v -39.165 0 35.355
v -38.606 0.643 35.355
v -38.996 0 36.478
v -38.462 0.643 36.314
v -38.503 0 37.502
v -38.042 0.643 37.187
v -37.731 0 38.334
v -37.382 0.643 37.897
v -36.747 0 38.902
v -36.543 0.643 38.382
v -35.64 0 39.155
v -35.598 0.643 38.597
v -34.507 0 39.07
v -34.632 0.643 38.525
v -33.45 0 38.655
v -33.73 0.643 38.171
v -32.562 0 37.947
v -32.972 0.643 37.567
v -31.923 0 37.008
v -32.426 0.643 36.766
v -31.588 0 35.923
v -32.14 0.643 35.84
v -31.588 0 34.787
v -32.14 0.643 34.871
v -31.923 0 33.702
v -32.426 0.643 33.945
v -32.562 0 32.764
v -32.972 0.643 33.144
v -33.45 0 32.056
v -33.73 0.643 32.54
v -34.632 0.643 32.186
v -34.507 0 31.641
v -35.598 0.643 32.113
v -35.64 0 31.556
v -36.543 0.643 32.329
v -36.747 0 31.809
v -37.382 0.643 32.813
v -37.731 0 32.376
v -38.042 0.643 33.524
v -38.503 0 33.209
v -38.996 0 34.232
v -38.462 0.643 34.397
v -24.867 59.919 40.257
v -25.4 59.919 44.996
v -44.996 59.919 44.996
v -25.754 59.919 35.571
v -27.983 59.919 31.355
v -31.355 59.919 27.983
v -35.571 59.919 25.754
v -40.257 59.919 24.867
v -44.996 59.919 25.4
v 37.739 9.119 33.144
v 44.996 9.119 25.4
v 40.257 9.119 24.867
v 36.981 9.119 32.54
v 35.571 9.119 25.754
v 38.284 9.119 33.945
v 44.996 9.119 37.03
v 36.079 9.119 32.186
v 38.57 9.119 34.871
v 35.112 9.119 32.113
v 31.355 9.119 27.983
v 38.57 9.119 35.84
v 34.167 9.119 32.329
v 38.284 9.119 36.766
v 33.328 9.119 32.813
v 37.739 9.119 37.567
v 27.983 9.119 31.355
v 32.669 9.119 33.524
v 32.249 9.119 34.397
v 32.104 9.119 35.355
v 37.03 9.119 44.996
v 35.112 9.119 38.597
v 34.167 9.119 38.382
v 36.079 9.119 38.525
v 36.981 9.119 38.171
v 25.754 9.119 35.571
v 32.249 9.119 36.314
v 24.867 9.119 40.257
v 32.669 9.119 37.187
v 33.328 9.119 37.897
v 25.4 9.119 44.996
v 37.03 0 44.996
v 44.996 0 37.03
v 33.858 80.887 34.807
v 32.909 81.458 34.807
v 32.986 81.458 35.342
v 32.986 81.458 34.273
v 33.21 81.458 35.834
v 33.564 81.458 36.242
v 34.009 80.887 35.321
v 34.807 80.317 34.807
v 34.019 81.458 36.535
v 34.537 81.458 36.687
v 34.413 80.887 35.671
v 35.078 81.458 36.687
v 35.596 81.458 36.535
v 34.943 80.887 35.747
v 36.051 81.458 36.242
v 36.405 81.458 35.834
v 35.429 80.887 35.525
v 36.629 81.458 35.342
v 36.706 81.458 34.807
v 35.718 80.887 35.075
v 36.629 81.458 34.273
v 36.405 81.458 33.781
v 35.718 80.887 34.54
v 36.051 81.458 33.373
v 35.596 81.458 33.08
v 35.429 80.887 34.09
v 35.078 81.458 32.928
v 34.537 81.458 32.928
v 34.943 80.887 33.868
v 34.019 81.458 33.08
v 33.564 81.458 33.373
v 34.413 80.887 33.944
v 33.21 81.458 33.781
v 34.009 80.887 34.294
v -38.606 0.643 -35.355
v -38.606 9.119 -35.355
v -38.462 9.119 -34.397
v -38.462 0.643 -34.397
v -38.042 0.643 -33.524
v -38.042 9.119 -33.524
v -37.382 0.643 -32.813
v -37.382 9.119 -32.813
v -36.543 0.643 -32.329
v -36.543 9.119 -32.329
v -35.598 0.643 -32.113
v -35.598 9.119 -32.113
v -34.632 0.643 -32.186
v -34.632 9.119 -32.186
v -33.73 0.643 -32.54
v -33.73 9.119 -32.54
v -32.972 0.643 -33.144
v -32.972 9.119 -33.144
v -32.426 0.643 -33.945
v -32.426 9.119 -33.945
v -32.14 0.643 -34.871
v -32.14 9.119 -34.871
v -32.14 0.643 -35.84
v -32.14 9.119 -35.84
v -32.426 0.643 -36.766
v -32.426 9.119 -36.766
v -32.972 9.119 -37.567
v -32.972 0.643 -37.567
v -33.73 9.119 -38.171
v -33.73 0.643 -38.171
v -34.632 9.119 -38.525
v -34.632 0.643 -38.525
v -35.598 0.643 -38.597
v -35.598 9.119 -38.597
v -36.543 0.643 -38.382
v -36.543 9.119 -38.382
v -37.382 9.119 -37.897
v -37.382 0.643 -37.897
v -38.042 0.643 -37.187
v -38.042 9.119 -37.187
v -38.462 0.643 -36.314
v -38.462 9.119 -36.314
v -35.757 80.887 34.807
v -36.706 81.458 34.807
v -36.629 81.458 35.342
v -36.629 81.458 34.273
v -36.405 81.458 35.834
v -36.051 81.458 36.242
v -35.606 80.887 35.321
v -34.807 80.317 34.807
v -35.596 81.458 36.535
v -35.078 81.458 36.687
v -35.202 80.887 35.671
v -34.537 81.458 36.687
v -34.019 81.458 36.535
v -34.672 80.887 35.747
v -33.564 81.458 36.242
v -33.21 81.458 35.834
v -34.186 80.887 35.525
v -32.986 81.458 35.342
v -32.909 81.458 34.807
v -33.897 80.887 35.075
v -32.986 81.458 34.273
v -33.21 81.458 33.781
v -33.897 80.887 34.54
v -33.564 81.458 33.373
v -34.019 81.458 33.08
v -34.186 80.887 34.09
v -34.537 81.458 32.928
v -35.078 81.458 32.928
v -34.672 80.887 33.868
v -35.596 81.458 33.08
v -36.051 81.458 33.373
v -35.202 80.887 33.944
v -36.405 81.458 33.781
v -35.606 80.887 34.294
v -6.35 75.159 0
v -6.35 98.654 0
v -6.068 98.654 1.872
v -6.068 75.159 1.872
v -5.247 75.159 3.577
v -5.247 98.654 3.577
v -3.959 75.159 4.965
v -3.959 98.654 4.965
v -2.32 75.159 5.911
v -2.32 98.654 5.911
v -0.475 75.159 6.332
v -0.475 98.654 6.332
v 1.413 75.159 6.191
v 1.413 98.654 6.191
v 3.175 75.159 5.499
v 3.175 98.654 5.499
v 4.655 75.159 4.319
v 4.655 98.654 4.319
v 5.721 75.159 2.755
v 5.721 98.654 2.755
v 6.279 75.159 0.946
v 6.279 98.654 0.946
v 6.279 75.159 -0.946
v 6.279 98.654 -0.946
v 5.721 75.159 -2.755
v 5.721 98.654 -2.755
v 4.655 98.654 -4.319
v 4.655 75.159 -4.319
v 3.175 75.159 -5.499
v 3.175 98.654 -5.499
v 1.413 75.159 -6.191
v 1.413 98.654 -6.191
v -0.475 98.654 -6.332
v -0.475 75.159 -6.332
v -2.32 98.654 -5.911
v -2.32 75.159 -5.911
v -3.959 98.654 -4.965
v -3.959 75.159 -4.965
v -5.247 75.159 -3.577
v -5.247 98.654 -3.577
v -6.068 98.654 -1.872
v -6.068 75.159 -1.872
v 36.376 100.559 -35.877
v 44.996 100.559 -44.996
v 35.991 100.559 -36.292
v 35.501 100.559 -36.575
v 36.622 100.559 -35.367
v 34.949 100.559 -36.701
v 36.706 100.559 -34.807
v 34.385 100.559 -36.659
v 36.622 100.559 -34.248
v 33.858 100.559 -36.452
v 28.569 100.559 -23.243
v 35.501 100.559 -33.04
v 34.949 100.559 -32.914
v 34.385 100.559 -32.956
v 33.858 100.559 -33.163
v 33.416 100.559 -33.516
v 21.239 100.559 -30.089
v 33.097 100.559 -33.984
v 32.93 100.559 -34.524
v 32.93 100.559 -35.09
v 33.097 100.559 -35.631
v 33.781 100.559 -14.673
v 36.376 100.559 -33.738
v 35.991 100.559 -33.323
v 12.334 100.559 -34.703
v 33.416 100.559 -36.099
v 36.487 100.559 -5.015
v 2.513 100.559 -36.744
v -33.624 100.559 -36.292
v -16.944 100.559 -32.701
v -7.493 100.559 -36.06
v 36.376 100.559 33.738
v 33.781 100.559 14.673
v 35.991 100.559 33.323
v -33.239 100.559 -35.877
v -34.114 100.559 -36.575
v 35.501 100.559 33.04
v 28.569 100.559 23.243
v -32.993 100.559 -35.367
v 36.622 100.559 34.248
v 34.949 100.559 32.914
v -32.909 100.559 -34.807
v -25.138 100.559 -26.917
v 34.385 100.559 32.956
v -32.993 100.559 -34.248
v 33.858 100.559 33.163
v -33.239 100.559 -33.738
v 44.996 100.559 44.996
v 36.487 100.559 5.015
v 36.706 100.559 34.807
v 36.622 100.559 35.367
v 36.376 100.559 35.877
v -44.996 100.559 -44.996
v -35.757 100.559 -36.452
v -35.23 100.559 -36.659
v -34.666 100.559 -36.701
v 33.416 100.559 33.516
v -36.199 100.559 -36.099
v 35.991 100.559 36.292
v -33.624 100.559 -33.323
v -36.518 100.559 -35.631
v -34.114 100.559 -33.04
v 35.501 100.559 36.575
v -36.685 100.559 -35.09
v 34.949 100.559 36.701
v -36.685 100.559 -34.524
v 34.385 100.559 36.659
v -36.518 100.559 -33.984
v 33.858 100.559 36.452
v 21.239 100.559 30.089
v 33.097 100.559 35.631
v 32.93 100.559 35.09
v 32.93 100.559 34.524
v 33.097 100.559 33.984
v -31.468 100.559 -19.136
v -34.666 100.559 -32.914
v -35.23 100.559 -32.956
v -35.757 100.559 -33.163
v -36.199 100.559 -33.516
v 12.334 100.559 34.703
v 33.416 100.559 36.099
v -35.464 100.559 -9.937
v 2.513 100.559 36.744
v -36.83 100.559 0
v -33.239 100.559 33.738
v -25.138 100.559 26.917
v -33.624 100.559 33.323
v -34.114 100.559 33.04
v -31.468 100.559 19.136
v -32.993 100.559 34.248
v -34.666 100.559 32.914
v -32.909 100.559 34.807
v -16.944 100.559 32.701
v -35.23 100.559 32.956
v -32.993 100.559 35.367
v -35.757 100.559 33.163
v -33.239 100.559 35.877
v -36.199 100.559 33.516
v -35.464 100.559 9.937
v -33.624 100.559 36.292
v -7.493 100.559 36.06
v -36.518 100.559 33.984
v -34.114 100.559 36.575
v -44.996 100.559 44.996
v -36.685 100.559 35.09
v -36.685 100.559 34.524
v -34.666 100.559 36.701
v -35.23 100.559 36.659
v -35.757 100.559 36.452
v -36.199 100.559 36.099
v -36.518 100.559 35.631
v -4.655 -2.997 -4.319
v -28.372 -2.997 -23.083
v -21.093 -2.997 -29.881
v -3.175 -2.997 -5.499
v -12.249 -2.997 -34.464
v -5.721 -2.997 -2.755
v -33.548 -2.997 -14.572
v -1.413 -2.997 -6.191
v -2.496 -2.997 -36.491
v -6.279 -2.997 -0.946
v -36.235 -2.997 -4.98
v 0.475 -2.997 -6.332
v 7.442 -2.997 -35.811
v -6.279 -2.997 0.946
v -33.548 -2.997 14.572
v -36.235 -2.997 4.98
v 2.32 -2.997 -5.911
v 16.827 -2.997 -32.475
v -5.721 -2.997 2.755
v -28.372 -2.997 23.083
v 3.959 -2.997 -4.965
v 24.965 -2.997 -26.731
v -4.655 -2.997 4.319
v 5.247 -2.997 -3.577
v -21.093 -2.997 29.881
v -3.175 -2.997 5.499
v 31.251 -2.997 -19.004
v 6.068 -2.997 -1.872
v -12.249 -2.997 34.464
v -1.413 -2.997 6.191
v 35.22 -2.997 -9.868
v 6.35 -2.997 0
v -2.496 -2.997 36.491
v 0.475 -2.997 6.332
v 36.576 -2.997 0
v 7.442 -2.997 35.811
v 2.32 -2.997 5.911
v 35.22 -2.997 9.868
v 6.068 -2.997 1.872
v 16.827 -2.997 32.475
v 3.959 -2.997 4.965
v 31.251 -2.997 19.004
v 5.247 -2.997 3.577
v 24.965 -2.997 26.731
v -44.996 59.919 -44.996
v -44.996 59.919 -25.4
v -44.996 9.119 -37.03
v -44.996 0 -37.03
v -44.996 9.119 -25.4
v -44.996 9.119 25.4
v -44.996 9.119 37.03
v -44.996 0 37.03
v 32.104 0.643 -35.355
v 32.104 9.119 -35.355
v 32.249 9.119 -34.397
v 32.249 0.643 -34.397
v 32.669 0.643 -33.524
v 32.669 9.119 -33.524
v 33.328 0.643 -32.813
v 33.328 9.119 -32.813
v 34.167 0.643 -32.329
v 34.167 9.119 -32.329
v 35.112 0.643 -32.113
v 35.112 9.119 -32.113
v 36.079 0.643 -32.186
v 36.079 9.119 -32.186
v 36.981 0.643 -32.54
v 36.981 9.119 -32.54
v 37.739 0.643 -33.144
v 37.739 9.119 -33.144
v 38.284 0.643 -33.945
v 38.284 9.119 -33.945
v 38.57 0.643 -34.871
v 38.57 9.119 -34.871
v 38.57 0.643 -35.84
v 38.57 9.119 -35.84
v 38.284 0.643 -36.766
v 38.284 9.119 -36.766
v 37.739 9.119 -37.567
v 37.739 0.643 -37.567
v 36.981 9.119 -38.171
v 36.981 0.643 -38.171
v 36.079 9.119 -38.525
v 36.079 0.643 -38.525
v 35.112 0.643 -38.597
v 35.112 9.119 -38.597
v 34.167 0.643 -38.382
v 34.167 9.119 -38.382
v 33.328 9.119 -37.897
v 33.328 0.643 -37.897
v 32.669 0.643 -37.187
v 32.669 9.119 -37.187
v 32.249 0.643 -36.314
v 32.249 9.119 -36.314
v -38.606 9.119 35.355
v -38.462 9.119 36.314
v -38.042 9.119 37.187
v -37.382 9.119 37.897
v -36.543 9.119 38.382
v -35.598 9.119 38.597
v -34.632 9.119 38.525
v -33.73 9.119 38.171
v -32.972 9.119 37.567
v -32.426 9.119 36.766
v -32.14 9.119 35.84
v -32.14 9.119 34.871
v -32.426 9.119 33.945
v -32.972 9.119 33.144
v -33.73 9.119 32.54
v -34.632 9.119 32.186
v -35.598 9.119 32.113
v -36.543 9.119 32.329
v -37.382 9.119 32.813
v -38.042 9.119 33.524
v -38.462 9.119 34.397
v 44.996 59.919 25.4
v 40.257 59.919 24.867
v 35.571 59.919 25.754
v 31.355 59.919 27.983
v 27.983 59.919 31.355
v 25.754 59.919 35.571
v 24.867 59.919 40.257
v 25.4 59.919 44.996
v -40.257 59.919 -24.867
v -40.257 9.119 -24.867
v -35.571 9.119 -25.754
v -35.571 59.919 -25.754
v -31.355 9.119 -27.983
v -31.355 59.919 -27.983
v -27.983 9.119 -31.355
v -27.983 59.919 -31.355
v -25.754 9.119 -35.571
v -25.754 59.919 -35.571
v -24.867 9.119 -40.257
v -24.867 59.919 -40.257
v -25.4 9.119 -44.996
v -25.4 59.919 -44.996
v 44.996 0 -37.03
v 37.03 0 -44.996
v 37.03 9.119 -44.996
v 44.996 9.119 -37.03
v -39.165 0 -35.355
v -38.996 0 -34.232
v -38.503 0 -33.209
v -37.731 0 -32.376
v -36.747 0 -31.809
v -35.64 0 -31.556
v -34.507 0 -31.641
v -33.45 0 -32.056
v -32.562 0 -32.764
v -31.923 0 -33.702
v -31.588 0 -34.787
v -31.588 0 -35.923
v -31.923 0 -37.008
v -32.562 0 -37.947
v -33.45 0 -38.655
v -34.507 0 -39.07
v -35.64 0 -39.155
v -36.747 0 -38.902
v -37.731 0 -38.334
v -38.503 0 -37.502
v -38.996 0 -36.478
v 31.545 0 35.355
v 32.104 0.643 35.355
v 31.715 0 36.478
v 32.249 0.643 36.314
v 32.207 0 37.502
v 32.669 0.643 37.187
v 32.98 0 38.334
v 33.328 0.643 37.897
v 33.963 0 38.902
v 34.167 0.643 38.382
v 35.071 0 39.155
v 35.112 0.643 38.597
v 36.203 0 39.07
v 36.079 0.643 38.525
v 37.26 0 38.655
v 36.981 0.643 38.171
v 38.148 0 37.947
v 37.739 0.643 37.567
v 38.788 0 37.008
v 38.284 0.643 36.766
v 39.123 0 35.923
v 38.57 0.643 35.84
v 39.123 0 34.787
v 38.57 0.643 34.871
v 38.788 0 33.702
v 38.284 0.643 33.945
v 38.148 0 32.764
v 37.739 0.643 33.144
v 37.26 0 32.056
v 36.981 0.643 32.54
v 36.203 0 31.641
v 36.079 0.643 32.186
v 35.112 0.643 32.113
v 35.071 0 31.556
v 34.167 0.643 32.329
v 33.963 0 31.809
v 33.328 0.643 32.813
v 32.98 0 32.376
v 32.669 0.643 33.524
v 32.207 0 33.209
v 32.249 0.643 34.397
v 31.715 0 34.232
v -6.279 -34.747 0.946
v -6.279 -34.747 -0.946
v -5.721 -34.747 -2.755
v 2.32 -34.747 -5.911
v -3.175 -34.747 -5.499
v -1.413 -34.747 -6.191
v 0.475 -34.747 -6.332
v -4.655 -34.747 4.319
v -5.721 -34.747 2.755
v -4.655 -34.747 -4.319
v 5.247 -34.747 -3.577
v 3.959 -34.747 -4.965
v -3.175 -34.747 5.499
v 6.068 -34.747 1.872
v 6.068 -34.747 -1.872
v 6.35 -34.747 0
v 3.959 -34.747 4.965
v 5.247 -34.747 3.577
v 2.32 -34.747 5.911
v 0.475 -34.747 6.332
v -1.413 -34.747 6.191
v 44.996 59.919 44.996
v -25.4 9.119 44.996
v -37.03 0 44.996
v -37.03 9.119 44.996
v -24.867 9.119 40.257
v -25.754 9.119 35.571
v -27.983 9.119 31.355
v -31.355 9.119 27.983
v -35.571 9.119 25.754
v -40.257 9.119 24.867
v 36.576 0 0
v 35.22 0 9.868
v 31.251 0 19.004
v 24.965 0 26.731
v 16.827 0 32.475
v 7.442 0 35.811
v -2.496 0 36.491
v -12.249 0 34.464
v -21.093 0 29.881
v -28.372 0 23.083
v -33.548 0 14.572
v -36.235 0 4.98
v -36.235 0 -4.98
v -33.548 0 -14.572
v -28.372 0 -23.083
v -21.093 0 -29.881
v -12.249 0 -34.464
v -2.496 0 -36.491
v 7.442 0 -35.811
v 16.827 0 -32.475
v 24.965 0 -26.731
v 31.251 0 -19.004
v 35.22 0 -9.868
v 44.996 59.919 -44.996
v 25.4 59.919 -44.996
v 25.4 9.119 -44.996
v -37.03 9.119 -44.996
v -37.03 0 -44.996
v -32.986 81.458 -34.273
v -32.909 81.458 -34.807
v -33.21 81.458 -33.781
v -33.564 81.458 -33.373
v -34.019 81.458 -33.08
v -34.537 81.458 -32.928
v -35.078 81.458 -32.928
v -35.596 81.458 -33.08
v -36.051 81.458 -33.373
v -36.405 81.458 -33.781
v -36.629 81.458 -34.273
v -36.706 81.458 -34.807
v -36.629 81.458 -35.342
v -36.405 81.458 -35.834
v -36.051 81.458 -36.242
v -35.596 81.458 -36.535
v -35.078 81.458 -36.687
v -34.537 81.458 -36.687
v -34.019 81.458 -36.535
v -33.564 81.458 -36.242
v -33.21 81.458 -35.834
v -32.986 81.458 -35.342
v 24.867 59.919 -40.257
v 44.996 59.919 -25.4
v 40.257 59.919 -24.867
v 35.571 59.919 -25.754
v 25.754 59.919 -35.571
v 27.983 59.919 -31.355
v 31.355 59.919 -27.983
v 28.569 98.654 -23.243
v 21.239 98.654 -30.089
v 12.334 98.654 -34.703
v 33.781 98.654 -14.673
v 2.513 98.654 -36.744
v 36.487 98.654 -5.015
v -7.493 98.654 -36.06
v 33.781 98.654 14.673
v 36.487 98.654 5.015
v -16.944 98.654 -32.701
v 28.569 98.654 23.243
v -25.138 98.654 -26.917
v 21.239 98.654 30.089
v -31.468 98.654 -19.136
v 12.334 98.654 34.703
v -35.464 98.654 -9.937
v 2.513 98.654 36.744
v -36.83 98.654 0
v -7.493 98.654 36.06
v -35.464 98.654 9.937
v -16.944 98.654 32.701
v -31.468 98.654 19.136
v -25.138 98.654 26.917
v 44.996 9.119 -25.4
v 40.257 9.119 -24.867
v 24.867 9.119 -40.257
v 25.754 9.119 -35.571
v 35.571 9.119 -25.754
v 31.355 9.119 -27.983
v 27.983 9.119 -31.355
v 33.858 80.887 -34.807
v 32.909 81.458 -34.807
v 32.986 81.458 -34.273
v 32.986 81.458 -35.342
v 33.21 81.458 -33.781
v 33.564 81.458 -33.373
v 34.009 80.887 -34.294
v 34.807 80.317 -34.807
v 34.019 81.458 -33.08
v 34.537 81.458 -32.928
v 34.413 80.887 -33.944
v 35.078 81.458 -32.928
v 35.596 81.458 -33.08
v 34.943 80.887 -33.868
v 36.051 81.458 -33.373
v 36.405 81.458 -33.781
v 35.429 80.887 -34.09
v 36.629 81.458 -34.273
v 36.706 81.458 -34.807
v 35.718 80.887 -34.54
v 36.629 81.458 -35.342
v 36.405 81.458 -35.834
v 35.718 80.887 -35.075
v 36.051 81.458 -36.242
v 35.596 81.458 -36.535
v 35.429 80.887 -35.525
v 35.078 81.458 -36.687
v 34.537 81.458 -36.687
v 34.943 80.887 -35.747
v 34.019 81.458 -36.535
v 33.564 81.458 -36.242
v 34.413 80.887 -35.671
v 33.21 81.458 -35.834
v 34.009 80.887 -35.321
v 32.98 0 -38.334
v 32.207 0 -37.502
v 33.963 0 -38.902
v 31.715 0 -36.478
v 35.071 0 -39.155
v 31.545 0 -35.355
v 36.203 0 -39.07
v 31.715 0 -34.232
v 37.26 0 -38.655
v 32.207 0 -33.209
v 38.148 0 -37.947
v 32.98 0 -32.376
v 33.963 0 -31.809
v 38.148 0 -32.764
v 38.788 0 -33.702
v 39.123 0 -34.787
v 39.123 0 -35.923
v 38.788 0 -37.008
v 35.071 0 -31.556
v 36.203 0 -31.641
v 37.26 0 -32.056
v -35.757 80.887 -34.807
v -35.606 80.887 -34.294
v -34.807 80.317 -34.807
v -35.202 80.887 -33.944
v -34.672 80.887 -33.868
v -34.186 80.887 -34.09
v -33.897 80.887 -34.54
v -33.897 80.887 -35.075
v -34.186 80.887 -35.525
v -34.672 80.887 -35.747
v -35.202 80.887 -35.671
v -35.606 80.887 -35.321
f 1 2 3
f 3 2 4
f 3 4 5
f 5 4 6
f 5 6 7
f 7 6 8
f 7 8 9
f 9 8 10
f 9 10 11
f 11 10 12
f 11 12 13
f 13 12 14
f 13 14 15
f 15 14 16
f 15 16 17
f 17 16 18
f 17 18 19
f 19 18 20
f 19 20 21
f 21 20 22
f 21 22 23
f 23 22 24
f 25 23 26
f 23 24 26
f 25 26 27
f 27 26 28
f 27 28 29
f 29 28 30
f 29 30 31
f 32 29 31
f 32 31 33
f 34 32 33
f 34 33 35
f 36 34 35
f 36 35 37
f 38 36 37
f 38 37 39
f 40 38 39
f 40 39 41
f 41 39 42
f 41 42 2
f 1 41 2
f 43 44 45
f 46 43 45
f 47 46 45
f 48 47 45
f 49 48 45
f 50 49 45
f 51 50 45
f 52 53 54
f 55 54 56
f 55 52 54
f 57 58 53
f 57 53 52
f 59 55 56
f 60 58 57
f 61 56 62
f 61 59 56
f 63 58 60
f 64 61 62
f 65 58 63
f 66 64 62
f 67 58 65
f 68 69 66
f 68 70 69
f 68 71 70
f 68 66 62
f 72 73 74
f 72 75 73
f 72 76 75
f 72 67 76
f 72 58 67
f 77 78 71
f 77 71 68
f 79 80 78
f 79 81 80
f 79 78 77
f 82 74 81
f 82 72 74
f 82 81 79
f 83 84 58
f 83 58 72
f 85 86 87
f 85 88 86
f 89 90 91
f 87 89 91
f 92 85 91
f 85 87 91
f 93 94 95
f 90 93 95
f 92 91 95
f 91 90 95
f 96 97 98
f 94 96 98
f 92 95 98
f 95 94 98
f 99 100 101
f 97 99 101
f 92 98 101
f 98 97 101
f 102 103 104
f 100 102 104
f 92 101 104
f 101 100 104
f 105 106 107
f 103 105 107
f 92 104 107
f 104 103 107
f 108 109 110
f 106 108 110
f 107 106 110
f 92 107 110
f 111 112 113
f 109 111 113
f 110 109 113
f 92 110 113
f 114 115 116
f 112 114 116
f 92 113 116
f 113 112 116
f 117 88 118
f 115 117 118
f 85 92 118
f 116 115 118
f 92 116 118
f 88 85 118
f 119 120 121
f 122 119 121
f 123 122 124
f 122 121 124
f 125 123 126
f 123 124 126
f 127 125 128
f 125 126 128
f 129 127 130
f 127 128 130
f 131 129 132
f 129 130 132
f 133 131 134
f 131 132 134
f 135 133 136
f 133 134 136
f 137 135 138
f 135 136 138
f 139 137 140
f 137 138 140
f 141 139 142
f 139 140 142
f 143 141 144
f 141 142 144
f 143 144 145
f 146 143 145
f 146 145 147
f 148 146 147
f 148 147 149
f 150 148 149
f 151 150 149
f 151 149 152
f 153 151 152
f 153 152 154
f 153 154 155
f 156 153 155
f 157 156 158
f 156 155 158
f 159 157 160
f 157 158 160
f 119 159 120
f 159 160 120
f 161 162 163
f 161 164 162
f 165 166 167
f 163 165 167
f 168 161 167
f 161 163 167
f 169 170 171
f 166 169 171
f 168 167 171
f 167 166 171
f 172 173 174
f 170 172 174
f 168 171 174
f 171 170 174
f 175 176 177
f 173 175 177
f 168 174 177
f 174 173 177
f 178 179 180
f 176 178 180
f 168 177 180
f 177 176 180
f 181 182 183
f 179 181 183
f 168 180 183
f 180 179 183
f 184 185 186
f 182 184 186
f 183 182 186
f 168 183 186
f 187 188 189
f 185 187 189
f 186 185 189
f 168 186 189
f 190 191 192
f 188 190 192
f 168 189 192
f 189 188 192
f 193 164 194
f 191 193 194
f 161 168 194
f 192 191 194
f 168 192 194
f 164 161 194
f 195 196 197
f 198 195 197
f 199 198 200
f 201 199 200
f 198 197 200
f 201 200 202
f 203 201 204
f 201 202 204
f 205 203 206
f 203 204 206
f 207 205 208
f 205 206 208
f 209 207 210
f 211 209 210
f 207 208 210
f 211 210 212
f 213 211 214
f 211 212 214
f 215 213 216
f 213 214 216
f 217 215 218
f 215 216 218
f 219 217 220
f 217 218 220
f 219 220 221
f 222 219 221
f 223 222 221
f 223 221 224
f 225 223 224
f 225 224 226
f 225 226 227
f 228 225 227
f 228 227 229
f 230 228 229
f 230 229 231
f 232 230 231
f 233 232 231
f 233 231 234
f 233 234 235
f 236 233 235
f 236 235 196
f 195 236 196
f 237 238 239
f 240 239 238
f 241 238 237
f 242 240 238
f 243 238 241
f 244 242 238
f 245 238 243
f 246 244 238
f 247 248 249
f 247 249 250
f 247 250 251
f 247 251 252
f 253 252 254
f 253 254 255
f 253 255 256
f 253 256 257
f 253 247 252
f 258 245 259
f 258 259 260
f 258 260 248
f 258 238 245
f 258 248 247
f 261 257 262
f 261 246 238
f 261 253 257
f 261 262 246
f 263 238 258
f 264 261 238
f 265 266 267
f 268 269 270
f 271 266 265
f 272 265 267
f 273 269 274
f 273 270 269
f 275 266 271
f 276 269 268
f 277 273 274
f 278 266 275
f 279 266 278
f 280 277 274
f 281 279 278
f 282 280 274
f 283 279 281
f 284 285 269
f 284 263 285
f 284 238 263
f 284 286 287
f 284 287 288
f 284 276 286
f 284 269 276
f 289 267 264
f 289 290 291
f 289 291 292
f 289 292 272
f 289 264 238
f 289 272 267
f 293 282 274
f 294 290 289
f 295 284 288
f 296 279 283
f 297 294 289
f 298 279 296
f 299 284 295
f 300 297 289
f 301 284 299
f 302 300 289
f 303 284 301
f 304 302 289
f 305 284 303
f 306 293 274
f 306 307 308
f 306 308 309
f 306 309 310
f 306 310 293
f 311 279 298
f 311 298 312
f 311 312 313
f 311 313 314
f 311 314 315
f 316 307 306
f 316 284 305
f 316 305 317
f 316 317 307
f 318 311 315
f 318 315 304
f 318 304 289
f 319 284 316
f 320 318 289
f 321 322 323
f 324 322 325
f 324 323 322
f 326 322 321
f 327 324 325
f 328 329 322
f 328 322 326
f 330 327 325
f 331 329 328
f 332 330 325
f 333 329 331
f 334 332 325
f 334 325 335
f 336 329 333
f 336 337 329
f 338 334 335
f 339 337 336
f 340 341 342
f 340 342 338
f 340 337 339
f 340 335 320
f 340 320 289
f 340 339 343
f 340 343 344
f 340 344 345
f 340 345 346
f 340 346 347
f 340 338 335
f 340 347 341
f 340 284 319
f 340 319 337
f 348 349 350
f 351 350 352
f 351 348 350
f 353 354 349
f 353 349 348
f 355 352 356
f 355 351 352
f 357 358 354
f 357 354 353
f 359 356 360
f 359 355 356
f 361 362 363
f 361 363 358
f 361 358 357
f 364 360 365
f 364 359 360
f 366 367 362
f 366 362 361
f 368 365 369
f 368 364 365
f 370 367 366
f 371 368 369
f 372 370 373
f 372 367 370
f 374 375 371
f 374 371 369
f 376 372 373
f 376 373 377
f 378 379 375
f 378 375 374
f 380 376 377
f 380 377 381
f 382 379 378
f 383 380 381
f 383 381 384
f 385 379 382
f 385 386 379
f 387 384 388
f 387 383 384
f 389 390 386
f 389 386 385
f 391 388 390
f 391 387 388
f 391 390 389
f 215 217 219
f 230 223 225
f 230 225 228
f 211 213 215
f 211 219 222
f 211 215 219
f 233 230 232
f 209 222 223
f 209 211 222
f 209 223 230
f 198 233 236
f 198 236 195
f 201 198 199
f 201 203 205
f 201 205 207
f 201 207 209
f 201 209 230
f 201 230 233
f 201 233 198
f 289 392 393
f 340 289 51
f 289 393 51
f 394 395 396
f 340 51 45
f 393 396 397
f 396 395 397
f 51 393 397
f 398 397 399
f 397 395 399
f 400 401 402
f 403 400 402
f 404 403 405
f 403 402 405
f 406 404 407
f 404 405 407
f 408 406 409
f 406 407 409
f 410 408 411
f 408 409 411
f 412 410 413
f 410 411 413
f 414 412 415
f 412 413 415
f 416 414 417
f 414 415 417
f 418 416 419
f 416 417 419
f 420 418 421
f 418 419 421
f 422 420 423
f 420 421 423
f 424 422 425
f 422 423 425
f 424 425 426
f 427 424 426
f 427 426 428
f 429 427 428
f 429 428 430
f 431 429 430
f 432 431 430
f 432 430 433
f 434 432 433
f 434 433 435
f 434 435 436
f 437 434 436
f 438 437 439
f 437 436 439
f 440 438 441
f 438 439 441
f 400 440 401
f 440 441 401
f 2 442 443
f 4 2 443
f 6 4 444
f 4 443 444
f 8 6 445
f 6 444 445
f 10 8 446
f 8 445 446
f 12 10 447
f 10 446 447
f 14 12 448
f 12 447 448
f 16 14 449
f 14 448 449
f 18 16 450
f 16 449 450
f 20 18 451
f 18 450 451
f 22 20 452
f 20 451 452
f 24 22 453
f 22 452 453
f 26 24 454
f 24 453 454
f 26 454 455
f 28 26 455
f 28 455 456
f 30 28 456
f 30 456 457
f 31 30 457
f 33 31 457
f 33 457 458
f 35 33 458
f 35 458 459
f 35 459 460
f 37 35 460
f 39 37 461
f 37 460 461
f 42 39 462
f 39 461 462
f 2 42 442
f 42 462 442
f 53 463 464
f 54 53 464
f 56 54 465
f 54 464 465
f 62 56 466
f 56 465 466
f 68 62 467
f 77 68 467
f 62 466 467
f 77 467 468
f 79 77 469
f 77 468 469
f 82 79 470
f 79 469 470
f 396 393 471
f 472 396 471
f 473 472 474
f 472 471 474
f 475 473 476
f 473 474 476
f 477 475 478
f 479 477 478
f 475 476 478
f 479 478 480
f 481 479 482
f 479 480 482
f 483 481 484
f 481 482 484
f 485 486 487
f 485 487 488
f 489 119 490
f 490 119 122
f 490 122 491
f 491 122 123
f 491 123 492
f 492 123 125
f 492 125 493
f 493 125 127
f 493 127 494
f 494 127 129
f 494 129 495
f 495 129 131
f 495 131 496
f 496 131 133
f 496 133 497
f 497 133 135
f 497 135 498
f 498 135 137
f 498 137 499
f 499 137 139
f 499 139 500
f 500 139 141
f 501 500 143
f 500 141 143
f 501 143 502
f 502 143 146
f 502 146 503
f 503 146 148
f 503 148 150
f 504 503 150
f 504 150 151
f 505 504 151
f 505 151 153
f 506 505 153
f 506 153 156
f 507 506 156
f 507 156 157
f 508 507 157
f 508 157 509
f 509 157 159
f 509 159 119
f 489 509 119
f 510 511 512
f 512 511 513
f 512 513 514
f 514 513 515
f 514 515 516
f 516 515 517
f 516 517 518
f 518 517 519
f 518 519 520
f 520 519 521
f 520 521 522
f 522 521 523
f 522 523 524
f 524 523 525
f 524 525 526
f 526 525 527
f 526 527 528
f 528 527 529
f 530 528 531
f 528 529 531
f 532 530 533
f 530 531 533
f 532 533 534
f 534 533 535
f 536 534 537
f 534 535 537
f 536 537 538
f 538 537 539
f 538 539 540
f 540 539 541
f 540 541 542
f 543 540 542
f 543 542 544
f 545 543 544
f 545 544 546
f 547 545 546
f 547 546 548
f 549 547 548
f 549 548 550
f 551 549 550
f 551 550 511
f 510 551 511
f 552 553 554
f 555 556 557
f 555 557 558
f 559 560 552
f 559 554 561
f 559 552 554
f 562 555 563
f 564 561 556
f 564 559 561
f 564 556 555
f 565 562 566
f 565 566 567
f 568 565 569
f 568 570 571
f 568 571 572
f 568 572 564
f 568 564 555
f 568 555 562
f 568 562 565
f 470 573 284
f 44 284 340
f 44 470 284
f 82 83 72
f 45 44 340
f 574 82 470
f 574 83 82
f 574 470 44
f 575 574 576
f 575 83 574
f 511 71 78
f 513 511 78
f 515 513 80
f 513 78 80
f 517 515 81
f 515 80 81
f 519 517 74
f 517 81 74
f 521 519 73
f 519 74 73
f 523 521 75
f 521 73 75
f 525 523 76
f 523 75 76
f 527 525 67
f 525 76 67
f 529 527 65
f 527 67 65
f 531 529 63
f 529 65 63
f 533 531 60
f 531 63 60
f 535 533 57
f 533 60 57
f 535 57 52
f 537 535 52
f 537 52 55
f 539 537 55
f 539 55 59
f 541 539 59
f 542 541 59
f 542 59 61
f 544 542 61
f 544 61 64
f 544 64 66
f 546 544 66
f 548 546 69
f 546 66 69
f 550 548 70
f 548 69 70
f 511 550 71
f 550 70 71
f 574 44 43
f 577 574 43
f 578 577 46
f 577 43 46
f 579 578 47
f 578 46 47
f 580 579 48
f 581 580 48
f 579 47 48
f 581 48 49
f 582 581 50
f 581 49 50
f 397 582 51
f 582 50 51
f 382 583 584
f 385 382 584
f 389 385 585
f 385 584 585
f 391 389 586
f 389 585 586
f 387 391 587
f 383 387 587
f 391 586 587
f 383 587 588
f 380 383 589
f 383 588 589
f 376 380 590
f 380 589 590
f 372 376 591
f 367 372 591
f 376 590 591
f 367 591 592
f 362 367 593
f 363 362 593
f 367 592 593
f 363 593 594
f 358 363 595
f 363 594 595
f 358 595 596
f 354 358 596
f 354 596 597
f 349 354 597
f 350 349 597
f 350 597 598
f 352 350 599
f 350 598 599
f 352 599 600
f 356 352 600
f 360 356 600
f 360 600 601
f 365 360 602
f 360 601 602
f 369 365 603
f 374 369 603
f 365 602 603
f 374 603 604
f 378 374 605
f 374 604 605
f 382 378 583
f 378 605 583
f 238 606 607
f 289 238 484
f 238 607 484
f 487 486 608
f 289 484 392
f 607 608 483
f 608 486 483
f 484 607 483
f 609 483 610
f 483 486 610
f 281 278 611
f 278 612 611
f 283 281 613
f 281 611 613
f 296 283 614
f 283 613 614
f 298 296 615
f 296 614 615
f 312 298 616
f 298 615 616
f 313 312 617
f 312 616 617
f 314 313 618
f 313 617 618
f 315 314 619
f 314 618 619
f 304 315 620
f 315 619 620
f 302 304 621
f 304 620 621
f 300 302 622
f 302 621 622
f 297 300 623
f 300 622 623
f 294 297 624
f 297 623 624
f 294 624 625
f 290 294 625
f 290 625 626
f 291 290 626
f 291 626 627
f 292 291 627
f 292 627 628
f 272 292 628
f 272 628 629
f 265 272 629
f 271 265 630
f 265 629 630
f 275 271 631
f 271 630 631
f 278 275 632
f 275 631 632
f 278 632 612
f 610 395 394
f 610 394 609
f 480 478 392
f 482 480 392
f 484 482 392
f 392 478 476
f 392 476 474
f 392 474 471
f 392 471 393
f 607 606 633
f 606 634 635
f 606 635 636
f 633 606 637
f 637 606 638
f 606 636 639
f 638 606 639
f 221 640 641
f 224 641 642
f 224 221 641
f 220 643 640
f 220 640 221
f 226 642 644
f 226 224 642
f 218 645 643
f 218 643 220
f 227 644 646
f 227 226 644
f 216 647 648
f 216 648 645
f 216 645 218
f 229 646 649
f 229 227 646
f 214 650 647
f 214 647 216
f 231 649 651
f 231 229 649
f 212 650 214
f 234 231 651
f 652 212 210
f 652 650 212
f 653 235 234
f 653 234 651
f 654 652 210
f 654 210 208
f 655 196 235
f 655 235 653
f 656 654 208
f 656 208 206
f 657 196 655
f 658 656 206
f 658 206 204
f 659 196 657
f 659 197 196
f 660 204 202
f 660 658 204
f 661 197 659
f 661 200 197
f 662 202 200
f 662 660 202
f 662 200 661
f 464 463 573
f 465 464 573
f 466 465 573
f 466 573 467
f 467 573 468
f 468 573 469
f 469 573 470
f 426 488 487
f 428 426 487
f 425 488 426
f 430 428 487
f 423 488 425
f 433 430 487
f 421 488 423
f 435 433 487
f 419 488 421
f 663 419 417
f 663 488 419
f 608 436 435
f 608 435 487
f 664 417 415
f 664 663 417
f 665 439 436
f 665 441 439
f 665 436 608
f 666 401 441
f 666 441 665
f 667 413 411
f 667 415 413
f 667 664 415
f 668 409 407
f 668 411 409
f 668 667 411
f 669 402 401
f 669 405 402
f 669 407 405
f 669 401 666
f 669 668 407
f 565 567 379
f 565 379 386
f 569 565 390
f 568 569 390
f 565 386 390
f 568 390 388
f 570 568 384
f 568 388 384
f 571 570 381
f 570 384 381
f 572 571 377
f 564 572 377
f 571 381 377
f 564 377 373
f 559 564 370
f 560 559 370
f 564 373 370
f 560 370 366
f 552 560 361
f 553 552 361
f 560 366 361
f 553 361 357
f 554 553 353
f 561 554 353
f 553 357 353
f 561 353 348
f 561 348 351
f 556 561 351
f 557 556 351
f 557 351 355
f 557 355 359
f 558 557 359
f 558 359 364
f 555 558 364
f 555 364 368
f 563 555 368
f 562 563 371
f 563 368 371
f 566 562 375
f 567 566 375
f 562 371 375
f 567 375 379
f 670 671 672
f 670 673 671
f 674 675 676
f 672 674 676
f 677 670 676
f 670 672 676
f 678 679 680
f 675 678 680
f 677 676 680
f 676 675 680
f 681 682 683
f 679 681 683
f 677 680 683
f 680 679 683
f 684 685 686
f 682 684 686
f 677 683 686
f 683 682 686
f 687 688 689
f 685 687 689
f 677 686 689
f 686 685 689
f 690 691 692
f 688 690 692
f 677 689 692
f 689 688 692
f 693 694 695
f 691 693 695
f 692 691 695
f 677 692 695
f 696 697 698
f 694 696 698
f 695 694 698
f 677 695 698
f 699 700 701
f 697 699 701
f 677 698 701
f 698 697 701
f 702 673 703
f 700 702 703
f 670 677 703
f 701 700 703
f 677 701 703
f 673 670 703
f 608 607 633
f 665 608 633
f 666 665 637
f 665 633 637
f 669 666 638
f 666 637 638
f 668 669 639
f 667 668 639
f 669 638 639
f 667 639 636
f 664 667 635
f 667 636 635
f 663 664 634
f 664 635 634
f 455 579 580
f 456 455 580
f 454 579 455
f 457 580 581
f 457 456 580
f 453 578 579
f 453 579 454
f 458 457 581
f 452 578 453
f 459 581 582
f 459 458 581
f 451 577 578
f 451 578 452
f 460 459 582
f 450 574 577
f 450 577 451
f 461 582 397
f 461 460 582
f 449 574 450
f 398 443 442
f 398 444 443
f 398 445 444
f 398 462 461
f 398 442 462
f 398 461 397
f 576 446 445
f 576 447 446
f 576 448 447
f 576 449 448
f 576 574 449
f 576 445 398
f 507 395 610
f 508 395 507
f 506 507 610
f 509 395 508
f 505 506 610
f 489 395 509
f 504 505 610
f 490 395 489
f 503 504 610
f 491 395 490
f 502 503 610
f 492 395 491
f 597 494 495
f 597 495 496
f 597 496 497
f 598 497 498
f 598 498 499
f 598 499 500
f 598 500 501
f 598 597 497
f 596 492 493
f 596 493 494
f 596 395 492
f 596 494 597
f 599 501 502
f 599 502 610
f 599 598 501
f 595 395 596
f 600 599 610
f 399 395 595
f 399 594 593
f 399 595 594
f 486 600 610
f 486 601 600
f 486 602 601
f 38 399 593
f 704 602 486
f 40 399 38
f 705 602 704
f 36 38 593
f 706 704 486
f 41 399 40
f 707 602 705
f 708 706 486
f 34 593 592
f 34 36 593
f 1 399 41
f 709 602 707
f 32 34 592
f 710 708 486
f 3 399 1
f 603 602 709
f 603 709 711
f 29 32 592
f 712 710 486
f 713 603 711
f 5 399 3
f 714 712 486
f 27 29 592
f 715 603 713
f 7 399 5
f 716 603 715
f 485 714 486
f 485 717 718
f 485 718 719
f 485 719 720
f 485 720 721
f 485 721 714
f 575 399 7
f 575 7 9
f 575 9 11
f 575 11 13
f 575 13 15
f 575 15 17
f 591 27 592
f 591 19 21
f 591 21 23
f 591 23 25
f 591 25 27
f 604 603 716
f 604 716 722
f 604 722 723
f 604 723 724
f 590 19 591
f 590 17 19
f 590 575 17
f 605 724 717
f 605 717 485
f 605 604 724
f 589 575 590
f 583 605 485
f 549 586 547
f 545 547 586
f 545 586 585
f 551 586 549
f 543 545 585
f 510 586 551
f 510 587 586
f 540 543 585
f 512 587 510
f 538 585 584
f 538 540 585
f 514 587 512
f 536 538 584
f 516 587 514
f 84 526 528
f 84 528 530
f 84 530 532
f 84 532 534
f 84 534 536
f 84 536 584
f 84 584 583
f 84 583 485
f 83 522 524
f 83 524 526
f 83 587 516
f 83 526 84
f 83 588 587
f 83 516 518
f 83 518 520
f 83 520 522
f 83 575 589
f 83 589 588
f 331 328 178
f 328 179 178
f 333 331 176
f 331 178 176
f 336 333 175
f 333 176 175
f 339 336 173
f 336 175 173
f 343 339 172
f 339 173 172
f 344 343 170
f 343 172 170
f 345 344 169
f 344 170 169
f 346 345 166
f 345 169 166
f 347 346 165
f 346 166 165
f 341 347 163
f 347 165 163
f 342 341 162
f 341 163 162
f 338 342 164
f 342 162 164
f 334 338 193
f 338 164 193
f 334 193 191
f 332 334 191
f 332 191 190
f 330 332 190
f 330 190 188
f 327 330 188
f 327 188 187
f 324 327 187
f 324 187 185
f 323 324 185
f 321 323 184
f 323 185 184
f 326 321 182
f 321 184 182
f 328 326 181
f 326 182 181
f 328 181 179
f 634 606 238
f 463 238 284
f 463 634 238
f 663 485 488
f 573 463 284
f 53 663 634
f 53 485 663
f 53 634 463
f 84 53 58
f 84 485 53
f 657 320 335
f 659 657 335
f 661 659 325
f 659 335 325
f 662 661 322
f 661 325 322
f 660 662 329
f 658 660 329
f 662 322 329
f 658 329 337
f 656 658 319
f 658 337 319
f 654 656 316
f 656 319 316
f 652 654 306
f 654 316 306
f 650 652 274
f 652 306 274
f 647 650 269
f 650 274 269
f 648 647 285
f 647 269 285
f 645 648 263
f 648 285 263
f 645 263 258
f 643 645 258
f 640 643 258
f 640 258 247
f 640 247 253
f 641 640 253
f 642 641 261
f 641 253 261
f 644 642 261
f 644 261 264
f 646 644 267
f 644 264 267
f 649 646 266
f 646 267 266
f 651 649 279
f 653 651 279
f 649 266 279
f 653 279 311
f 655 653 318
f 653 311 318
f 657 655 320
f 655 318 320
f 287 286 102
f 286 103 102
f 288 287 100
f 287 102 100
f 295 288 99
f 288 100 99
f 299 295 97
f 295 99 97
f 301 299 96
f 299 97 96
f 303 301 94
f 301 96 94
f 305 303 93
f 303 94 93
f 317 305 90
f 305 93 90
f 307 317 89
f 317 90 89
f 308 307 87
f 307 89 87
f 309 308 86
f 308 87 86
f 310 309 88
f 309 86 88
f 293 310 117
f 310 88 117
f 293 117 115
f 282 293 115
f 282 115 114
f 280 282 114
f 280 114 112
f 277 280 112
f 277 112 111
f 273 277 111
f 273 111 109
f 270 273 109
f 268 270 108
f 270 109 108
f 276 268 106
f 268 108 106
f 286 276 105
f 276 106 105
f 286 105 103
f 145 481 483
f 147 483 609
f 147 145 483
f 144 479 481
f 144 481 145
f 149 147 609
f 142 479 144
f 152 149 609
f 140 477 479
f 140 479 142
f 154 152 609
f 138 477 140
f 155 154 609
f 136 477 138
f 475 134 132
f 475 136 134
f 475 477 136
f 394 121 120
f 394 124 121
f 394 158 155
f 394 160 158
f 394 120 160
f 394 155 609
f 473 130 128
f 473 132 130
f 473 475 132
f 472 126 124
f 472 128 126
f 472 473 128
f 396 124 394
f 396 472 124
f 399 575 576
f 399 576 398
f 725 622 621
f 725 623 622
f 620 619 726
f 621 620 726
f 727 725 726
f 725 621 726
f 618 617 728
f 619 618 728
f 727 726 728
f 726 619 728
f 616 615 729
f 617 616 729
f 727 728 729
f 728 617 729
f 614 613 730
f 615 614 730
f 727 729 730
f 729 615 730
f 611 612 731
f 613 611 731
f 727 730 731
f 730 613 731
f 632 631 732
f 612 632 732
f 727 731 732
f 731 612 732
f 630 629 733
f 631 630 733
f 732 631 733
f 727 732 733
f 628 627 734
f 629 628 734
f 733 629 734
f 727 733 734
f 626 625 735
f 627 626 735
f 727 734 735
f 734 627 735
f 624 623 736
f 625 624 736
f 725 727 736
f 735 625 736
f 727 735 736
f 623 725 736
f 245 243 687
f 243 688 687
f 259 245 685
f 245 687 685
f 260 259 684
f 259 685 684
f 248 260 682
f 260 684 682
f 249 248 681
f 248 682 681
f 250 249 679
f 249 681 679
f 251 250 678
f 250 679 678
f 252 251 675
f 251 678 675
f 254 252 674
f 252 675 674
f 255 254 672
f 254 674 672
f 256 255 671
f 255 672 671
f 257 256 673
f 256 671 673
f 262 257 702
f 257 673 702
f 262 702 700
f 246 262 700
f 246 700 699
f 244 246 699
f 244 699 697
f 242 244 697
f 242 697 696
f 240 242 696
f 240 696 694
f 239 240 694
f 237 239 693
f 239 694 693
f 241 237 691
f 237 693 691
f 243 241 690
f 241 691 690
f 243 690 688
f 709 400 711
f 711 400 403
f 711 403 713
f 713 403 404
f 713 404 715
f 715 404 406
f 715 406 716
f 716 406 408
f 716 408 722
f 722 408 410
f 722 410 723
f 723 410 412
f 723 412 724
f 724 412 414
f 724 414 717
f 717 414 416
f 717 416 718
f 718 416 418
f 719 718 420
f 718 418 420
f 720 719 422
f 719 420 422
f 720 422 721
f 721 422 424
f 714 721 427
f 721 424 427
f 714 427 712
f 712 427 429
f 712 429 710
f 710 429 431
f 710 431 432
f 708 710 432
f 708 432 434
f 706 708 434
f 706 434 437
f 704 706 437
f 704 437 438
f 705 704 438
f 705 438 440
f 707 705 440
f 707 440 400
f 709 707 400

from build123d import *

# Parameters (mm, degrees)
F1_DEPTH       = 59.9186
F2_D           = 6.5024
F2_DEPTH       = 59.9186
F2_CSINK_D     = 7.62
F2_CSINK_ANGLE = 82
F2_TIP         = 1.9535180446
F3_R           = 3.2512
F4_DEPTH       = 50.8
F5_W           = 89.9922
F5_H           = 89.9922
F6_DEPTH       = 40.64
F7_R           = 6.35
F8_DEPTH       = 25.4
F9_R           = 36.576
F10_DEPTH      = 2.9972
F11_R          = 6.35
F12_DEPTH      = 31.75
F14_D          = 3.7973
F14_DEPTH      = 19.1008
F14_TIP        = 1.1408240143
F13_R          = 36.83
F15_DEPTH      = 1.905


with BuildPart() as f1:
    # F0 (on Front) → F1 (new body)
    with BuildSketch(Plane.XZ):
        Polygon((44.9961, 37.0295594098), (37.0295594098, 44.9961), (-37.0295594098, 44.9961), (-44.9961, 37.0295594098), (-44.9961, -37.0295594098), (-37.0295594098, -44.9961), (37.0295594098, -44.9961), (44.9961, -37.0295594098), align=None)
    extrude(amount=-F1_DEPTH)

    # F2
    with Locations(Plane.XZ):
        with Locations((-35.3552683486, 35.3552683486), (-35.3552683486, -35.3552683486), (35.3552683486, -35.3552683486), (35.3552683486, 35.3552683486)):
            CounterSinkHole(F2_D / 2, F2_CSINK_D / 2, depth=F2_DEPTH, counter_sink_angle=F2_CSINK_ANGLE)
            with Locations((0, 0, -(F2_DEPTH + F2_TIP / 2))):  # 118° drill point
                Cone(0, F2_D / 2, F2_TIP, mode=Mode.SUBTRACT)

    # F3 (on face) → F4 (cut)
    with BuildSketch(Plane(origin=(0, 59.9186, 0), x_dir=(-1, 0, 0), z_dir=(0, 1, 0))):
        with BuildLine():
            Line((-44.9961, 37.0295594098), (-44.9961, 25.4))
            ThreePointArc((-44.9961, 25.4), (-29.5424518432, 29.5424518432), (-25.4, 44.9961))
            Line((-25.4, 44.9961), (-37.0295594098, 44.9961))
            Line((-37.0295594098, 44.9961), (-44.9961, 37.0295594098))
        make_face()
        with Locations((-35.3552683486, 35.3552683486)):
            Circle(F3_R, mode=Mode.SUBTRACT)
        with BuildLine():
            ThreePointArc((44.9961, -25.4), (29.5424518432, -29.5424518432), (25.4, -44.9961))
            Line((25.4, -44.9961), (37.0295594098, -44.9961))
            Line((37.0295594098, -44.9961), (44.9961, -37.0295594098))
            Line((44.9961, -37.0295594098), (44.9961, -25.4))
        make_face()
        with Locations((35.3552683486, -35.3552683486)):
            Circle(F3_R, mode=Mode.SUBTRACT)
        with BuildLine():
            ThreePointArc((-25.4, -44.9961), (-29.5424518432, -29.5424518432), (-44.9961, -25.4))
            Line((-44.9961, -25.4), (-44.9961, -37.0295594098))
            Line((-44.9961, -37.0295594098), (-37.0295594098, -44.9961))
            Line((-37.0295594098, -44.9961), (-25.4, -44.9961))
        make_face()
        with Locations((-35.3552683486, -35.3552683486)):
            Circle(F3_R, mode=Mode.SUBTRACT)
        with BuildLine():
            Line((37.0295594098, 44.9961), (25.4, 44.9961))
            ThreePointArc((25.4, 44.9961), (29.5424518432, 29.5424518432), (44.9961, 25.4))
            Line((44.9961, 25.4), (44.9961, 37.0295594098))
            Line((44.9961, 37.0295594098), (37.0295594098, 44.9961))
        make_face()
        with Locations((35.3552683486, 35.3552683486)):
            Circle(F3_R, mode=Mode.SUBTRACT)
    extrude(amount=-F4_DEPTH, mode=Mode.SUBTRACT)

    # F5 (on face) → F6 (join)
    with BuildSketch(Plane(origin=(0, 59.9186, 0), x_dir=(-1, 0, 0), z_dir=(0, 1, 0))):
        Rectangle(F5_W, F5_H)
    extrude(amount=F6_DEPTH)

    # F7 (on face) → F8 (cut)
    with BuildSketch(Plane(origin=(0, 100.5586, 0), x_dir=(-1, 0, 0), z_dir=(0, 1, 0))):
        Circle(F7_R)
    extrude(amount=-F8_DEPTH, mode=Mode.SUBTRACT)

    # F9 (on face) → F10 (join)
    with BuildSketch(Plane.XZ):
        Circle(F9_R)
    extrude(amount=F10_DEPTH)

    # F11 (on face) → F12 (join)
    with BuildSketch(Plane.XZ.offset(2.9972)):
        Circle(F11_R)
    extrude(amount=F12_DEPTH)

    # F14
    with Locations(Plane(origin=(0, 100.5586, 0), x_dir=(-1, 0, 0), z_dir=(0, 1, 0))):
        with Locations((-34.8074727253, 34.8074727253), (-34.8074727253, -34.8074727253), (34.8074727253, -34.8074727253), (34.8074727253, 34.8074727253)):
            Hole(F14_D / 2, depth=F14_DEPTH)
            with Locations((0, 0, -(F14_DEPTH + F14_TIP / 2))):  # 118° drill point
                Cone(0, F14_D / 2, F14_TIP, mode=Mode.SUBTRACT)

    # F13 (on face) → F15 (cut)
    with BuildSketch(Plane(origin=(0, 100.5586, 0), x_dir=(-1, 0, 0), z_dir=(0, 1, 0))):
        Circle(F13_R)
    extrude(amount=-F15_DEPTH, mode=Mode.SUBTRACT)


solid = f1.part
